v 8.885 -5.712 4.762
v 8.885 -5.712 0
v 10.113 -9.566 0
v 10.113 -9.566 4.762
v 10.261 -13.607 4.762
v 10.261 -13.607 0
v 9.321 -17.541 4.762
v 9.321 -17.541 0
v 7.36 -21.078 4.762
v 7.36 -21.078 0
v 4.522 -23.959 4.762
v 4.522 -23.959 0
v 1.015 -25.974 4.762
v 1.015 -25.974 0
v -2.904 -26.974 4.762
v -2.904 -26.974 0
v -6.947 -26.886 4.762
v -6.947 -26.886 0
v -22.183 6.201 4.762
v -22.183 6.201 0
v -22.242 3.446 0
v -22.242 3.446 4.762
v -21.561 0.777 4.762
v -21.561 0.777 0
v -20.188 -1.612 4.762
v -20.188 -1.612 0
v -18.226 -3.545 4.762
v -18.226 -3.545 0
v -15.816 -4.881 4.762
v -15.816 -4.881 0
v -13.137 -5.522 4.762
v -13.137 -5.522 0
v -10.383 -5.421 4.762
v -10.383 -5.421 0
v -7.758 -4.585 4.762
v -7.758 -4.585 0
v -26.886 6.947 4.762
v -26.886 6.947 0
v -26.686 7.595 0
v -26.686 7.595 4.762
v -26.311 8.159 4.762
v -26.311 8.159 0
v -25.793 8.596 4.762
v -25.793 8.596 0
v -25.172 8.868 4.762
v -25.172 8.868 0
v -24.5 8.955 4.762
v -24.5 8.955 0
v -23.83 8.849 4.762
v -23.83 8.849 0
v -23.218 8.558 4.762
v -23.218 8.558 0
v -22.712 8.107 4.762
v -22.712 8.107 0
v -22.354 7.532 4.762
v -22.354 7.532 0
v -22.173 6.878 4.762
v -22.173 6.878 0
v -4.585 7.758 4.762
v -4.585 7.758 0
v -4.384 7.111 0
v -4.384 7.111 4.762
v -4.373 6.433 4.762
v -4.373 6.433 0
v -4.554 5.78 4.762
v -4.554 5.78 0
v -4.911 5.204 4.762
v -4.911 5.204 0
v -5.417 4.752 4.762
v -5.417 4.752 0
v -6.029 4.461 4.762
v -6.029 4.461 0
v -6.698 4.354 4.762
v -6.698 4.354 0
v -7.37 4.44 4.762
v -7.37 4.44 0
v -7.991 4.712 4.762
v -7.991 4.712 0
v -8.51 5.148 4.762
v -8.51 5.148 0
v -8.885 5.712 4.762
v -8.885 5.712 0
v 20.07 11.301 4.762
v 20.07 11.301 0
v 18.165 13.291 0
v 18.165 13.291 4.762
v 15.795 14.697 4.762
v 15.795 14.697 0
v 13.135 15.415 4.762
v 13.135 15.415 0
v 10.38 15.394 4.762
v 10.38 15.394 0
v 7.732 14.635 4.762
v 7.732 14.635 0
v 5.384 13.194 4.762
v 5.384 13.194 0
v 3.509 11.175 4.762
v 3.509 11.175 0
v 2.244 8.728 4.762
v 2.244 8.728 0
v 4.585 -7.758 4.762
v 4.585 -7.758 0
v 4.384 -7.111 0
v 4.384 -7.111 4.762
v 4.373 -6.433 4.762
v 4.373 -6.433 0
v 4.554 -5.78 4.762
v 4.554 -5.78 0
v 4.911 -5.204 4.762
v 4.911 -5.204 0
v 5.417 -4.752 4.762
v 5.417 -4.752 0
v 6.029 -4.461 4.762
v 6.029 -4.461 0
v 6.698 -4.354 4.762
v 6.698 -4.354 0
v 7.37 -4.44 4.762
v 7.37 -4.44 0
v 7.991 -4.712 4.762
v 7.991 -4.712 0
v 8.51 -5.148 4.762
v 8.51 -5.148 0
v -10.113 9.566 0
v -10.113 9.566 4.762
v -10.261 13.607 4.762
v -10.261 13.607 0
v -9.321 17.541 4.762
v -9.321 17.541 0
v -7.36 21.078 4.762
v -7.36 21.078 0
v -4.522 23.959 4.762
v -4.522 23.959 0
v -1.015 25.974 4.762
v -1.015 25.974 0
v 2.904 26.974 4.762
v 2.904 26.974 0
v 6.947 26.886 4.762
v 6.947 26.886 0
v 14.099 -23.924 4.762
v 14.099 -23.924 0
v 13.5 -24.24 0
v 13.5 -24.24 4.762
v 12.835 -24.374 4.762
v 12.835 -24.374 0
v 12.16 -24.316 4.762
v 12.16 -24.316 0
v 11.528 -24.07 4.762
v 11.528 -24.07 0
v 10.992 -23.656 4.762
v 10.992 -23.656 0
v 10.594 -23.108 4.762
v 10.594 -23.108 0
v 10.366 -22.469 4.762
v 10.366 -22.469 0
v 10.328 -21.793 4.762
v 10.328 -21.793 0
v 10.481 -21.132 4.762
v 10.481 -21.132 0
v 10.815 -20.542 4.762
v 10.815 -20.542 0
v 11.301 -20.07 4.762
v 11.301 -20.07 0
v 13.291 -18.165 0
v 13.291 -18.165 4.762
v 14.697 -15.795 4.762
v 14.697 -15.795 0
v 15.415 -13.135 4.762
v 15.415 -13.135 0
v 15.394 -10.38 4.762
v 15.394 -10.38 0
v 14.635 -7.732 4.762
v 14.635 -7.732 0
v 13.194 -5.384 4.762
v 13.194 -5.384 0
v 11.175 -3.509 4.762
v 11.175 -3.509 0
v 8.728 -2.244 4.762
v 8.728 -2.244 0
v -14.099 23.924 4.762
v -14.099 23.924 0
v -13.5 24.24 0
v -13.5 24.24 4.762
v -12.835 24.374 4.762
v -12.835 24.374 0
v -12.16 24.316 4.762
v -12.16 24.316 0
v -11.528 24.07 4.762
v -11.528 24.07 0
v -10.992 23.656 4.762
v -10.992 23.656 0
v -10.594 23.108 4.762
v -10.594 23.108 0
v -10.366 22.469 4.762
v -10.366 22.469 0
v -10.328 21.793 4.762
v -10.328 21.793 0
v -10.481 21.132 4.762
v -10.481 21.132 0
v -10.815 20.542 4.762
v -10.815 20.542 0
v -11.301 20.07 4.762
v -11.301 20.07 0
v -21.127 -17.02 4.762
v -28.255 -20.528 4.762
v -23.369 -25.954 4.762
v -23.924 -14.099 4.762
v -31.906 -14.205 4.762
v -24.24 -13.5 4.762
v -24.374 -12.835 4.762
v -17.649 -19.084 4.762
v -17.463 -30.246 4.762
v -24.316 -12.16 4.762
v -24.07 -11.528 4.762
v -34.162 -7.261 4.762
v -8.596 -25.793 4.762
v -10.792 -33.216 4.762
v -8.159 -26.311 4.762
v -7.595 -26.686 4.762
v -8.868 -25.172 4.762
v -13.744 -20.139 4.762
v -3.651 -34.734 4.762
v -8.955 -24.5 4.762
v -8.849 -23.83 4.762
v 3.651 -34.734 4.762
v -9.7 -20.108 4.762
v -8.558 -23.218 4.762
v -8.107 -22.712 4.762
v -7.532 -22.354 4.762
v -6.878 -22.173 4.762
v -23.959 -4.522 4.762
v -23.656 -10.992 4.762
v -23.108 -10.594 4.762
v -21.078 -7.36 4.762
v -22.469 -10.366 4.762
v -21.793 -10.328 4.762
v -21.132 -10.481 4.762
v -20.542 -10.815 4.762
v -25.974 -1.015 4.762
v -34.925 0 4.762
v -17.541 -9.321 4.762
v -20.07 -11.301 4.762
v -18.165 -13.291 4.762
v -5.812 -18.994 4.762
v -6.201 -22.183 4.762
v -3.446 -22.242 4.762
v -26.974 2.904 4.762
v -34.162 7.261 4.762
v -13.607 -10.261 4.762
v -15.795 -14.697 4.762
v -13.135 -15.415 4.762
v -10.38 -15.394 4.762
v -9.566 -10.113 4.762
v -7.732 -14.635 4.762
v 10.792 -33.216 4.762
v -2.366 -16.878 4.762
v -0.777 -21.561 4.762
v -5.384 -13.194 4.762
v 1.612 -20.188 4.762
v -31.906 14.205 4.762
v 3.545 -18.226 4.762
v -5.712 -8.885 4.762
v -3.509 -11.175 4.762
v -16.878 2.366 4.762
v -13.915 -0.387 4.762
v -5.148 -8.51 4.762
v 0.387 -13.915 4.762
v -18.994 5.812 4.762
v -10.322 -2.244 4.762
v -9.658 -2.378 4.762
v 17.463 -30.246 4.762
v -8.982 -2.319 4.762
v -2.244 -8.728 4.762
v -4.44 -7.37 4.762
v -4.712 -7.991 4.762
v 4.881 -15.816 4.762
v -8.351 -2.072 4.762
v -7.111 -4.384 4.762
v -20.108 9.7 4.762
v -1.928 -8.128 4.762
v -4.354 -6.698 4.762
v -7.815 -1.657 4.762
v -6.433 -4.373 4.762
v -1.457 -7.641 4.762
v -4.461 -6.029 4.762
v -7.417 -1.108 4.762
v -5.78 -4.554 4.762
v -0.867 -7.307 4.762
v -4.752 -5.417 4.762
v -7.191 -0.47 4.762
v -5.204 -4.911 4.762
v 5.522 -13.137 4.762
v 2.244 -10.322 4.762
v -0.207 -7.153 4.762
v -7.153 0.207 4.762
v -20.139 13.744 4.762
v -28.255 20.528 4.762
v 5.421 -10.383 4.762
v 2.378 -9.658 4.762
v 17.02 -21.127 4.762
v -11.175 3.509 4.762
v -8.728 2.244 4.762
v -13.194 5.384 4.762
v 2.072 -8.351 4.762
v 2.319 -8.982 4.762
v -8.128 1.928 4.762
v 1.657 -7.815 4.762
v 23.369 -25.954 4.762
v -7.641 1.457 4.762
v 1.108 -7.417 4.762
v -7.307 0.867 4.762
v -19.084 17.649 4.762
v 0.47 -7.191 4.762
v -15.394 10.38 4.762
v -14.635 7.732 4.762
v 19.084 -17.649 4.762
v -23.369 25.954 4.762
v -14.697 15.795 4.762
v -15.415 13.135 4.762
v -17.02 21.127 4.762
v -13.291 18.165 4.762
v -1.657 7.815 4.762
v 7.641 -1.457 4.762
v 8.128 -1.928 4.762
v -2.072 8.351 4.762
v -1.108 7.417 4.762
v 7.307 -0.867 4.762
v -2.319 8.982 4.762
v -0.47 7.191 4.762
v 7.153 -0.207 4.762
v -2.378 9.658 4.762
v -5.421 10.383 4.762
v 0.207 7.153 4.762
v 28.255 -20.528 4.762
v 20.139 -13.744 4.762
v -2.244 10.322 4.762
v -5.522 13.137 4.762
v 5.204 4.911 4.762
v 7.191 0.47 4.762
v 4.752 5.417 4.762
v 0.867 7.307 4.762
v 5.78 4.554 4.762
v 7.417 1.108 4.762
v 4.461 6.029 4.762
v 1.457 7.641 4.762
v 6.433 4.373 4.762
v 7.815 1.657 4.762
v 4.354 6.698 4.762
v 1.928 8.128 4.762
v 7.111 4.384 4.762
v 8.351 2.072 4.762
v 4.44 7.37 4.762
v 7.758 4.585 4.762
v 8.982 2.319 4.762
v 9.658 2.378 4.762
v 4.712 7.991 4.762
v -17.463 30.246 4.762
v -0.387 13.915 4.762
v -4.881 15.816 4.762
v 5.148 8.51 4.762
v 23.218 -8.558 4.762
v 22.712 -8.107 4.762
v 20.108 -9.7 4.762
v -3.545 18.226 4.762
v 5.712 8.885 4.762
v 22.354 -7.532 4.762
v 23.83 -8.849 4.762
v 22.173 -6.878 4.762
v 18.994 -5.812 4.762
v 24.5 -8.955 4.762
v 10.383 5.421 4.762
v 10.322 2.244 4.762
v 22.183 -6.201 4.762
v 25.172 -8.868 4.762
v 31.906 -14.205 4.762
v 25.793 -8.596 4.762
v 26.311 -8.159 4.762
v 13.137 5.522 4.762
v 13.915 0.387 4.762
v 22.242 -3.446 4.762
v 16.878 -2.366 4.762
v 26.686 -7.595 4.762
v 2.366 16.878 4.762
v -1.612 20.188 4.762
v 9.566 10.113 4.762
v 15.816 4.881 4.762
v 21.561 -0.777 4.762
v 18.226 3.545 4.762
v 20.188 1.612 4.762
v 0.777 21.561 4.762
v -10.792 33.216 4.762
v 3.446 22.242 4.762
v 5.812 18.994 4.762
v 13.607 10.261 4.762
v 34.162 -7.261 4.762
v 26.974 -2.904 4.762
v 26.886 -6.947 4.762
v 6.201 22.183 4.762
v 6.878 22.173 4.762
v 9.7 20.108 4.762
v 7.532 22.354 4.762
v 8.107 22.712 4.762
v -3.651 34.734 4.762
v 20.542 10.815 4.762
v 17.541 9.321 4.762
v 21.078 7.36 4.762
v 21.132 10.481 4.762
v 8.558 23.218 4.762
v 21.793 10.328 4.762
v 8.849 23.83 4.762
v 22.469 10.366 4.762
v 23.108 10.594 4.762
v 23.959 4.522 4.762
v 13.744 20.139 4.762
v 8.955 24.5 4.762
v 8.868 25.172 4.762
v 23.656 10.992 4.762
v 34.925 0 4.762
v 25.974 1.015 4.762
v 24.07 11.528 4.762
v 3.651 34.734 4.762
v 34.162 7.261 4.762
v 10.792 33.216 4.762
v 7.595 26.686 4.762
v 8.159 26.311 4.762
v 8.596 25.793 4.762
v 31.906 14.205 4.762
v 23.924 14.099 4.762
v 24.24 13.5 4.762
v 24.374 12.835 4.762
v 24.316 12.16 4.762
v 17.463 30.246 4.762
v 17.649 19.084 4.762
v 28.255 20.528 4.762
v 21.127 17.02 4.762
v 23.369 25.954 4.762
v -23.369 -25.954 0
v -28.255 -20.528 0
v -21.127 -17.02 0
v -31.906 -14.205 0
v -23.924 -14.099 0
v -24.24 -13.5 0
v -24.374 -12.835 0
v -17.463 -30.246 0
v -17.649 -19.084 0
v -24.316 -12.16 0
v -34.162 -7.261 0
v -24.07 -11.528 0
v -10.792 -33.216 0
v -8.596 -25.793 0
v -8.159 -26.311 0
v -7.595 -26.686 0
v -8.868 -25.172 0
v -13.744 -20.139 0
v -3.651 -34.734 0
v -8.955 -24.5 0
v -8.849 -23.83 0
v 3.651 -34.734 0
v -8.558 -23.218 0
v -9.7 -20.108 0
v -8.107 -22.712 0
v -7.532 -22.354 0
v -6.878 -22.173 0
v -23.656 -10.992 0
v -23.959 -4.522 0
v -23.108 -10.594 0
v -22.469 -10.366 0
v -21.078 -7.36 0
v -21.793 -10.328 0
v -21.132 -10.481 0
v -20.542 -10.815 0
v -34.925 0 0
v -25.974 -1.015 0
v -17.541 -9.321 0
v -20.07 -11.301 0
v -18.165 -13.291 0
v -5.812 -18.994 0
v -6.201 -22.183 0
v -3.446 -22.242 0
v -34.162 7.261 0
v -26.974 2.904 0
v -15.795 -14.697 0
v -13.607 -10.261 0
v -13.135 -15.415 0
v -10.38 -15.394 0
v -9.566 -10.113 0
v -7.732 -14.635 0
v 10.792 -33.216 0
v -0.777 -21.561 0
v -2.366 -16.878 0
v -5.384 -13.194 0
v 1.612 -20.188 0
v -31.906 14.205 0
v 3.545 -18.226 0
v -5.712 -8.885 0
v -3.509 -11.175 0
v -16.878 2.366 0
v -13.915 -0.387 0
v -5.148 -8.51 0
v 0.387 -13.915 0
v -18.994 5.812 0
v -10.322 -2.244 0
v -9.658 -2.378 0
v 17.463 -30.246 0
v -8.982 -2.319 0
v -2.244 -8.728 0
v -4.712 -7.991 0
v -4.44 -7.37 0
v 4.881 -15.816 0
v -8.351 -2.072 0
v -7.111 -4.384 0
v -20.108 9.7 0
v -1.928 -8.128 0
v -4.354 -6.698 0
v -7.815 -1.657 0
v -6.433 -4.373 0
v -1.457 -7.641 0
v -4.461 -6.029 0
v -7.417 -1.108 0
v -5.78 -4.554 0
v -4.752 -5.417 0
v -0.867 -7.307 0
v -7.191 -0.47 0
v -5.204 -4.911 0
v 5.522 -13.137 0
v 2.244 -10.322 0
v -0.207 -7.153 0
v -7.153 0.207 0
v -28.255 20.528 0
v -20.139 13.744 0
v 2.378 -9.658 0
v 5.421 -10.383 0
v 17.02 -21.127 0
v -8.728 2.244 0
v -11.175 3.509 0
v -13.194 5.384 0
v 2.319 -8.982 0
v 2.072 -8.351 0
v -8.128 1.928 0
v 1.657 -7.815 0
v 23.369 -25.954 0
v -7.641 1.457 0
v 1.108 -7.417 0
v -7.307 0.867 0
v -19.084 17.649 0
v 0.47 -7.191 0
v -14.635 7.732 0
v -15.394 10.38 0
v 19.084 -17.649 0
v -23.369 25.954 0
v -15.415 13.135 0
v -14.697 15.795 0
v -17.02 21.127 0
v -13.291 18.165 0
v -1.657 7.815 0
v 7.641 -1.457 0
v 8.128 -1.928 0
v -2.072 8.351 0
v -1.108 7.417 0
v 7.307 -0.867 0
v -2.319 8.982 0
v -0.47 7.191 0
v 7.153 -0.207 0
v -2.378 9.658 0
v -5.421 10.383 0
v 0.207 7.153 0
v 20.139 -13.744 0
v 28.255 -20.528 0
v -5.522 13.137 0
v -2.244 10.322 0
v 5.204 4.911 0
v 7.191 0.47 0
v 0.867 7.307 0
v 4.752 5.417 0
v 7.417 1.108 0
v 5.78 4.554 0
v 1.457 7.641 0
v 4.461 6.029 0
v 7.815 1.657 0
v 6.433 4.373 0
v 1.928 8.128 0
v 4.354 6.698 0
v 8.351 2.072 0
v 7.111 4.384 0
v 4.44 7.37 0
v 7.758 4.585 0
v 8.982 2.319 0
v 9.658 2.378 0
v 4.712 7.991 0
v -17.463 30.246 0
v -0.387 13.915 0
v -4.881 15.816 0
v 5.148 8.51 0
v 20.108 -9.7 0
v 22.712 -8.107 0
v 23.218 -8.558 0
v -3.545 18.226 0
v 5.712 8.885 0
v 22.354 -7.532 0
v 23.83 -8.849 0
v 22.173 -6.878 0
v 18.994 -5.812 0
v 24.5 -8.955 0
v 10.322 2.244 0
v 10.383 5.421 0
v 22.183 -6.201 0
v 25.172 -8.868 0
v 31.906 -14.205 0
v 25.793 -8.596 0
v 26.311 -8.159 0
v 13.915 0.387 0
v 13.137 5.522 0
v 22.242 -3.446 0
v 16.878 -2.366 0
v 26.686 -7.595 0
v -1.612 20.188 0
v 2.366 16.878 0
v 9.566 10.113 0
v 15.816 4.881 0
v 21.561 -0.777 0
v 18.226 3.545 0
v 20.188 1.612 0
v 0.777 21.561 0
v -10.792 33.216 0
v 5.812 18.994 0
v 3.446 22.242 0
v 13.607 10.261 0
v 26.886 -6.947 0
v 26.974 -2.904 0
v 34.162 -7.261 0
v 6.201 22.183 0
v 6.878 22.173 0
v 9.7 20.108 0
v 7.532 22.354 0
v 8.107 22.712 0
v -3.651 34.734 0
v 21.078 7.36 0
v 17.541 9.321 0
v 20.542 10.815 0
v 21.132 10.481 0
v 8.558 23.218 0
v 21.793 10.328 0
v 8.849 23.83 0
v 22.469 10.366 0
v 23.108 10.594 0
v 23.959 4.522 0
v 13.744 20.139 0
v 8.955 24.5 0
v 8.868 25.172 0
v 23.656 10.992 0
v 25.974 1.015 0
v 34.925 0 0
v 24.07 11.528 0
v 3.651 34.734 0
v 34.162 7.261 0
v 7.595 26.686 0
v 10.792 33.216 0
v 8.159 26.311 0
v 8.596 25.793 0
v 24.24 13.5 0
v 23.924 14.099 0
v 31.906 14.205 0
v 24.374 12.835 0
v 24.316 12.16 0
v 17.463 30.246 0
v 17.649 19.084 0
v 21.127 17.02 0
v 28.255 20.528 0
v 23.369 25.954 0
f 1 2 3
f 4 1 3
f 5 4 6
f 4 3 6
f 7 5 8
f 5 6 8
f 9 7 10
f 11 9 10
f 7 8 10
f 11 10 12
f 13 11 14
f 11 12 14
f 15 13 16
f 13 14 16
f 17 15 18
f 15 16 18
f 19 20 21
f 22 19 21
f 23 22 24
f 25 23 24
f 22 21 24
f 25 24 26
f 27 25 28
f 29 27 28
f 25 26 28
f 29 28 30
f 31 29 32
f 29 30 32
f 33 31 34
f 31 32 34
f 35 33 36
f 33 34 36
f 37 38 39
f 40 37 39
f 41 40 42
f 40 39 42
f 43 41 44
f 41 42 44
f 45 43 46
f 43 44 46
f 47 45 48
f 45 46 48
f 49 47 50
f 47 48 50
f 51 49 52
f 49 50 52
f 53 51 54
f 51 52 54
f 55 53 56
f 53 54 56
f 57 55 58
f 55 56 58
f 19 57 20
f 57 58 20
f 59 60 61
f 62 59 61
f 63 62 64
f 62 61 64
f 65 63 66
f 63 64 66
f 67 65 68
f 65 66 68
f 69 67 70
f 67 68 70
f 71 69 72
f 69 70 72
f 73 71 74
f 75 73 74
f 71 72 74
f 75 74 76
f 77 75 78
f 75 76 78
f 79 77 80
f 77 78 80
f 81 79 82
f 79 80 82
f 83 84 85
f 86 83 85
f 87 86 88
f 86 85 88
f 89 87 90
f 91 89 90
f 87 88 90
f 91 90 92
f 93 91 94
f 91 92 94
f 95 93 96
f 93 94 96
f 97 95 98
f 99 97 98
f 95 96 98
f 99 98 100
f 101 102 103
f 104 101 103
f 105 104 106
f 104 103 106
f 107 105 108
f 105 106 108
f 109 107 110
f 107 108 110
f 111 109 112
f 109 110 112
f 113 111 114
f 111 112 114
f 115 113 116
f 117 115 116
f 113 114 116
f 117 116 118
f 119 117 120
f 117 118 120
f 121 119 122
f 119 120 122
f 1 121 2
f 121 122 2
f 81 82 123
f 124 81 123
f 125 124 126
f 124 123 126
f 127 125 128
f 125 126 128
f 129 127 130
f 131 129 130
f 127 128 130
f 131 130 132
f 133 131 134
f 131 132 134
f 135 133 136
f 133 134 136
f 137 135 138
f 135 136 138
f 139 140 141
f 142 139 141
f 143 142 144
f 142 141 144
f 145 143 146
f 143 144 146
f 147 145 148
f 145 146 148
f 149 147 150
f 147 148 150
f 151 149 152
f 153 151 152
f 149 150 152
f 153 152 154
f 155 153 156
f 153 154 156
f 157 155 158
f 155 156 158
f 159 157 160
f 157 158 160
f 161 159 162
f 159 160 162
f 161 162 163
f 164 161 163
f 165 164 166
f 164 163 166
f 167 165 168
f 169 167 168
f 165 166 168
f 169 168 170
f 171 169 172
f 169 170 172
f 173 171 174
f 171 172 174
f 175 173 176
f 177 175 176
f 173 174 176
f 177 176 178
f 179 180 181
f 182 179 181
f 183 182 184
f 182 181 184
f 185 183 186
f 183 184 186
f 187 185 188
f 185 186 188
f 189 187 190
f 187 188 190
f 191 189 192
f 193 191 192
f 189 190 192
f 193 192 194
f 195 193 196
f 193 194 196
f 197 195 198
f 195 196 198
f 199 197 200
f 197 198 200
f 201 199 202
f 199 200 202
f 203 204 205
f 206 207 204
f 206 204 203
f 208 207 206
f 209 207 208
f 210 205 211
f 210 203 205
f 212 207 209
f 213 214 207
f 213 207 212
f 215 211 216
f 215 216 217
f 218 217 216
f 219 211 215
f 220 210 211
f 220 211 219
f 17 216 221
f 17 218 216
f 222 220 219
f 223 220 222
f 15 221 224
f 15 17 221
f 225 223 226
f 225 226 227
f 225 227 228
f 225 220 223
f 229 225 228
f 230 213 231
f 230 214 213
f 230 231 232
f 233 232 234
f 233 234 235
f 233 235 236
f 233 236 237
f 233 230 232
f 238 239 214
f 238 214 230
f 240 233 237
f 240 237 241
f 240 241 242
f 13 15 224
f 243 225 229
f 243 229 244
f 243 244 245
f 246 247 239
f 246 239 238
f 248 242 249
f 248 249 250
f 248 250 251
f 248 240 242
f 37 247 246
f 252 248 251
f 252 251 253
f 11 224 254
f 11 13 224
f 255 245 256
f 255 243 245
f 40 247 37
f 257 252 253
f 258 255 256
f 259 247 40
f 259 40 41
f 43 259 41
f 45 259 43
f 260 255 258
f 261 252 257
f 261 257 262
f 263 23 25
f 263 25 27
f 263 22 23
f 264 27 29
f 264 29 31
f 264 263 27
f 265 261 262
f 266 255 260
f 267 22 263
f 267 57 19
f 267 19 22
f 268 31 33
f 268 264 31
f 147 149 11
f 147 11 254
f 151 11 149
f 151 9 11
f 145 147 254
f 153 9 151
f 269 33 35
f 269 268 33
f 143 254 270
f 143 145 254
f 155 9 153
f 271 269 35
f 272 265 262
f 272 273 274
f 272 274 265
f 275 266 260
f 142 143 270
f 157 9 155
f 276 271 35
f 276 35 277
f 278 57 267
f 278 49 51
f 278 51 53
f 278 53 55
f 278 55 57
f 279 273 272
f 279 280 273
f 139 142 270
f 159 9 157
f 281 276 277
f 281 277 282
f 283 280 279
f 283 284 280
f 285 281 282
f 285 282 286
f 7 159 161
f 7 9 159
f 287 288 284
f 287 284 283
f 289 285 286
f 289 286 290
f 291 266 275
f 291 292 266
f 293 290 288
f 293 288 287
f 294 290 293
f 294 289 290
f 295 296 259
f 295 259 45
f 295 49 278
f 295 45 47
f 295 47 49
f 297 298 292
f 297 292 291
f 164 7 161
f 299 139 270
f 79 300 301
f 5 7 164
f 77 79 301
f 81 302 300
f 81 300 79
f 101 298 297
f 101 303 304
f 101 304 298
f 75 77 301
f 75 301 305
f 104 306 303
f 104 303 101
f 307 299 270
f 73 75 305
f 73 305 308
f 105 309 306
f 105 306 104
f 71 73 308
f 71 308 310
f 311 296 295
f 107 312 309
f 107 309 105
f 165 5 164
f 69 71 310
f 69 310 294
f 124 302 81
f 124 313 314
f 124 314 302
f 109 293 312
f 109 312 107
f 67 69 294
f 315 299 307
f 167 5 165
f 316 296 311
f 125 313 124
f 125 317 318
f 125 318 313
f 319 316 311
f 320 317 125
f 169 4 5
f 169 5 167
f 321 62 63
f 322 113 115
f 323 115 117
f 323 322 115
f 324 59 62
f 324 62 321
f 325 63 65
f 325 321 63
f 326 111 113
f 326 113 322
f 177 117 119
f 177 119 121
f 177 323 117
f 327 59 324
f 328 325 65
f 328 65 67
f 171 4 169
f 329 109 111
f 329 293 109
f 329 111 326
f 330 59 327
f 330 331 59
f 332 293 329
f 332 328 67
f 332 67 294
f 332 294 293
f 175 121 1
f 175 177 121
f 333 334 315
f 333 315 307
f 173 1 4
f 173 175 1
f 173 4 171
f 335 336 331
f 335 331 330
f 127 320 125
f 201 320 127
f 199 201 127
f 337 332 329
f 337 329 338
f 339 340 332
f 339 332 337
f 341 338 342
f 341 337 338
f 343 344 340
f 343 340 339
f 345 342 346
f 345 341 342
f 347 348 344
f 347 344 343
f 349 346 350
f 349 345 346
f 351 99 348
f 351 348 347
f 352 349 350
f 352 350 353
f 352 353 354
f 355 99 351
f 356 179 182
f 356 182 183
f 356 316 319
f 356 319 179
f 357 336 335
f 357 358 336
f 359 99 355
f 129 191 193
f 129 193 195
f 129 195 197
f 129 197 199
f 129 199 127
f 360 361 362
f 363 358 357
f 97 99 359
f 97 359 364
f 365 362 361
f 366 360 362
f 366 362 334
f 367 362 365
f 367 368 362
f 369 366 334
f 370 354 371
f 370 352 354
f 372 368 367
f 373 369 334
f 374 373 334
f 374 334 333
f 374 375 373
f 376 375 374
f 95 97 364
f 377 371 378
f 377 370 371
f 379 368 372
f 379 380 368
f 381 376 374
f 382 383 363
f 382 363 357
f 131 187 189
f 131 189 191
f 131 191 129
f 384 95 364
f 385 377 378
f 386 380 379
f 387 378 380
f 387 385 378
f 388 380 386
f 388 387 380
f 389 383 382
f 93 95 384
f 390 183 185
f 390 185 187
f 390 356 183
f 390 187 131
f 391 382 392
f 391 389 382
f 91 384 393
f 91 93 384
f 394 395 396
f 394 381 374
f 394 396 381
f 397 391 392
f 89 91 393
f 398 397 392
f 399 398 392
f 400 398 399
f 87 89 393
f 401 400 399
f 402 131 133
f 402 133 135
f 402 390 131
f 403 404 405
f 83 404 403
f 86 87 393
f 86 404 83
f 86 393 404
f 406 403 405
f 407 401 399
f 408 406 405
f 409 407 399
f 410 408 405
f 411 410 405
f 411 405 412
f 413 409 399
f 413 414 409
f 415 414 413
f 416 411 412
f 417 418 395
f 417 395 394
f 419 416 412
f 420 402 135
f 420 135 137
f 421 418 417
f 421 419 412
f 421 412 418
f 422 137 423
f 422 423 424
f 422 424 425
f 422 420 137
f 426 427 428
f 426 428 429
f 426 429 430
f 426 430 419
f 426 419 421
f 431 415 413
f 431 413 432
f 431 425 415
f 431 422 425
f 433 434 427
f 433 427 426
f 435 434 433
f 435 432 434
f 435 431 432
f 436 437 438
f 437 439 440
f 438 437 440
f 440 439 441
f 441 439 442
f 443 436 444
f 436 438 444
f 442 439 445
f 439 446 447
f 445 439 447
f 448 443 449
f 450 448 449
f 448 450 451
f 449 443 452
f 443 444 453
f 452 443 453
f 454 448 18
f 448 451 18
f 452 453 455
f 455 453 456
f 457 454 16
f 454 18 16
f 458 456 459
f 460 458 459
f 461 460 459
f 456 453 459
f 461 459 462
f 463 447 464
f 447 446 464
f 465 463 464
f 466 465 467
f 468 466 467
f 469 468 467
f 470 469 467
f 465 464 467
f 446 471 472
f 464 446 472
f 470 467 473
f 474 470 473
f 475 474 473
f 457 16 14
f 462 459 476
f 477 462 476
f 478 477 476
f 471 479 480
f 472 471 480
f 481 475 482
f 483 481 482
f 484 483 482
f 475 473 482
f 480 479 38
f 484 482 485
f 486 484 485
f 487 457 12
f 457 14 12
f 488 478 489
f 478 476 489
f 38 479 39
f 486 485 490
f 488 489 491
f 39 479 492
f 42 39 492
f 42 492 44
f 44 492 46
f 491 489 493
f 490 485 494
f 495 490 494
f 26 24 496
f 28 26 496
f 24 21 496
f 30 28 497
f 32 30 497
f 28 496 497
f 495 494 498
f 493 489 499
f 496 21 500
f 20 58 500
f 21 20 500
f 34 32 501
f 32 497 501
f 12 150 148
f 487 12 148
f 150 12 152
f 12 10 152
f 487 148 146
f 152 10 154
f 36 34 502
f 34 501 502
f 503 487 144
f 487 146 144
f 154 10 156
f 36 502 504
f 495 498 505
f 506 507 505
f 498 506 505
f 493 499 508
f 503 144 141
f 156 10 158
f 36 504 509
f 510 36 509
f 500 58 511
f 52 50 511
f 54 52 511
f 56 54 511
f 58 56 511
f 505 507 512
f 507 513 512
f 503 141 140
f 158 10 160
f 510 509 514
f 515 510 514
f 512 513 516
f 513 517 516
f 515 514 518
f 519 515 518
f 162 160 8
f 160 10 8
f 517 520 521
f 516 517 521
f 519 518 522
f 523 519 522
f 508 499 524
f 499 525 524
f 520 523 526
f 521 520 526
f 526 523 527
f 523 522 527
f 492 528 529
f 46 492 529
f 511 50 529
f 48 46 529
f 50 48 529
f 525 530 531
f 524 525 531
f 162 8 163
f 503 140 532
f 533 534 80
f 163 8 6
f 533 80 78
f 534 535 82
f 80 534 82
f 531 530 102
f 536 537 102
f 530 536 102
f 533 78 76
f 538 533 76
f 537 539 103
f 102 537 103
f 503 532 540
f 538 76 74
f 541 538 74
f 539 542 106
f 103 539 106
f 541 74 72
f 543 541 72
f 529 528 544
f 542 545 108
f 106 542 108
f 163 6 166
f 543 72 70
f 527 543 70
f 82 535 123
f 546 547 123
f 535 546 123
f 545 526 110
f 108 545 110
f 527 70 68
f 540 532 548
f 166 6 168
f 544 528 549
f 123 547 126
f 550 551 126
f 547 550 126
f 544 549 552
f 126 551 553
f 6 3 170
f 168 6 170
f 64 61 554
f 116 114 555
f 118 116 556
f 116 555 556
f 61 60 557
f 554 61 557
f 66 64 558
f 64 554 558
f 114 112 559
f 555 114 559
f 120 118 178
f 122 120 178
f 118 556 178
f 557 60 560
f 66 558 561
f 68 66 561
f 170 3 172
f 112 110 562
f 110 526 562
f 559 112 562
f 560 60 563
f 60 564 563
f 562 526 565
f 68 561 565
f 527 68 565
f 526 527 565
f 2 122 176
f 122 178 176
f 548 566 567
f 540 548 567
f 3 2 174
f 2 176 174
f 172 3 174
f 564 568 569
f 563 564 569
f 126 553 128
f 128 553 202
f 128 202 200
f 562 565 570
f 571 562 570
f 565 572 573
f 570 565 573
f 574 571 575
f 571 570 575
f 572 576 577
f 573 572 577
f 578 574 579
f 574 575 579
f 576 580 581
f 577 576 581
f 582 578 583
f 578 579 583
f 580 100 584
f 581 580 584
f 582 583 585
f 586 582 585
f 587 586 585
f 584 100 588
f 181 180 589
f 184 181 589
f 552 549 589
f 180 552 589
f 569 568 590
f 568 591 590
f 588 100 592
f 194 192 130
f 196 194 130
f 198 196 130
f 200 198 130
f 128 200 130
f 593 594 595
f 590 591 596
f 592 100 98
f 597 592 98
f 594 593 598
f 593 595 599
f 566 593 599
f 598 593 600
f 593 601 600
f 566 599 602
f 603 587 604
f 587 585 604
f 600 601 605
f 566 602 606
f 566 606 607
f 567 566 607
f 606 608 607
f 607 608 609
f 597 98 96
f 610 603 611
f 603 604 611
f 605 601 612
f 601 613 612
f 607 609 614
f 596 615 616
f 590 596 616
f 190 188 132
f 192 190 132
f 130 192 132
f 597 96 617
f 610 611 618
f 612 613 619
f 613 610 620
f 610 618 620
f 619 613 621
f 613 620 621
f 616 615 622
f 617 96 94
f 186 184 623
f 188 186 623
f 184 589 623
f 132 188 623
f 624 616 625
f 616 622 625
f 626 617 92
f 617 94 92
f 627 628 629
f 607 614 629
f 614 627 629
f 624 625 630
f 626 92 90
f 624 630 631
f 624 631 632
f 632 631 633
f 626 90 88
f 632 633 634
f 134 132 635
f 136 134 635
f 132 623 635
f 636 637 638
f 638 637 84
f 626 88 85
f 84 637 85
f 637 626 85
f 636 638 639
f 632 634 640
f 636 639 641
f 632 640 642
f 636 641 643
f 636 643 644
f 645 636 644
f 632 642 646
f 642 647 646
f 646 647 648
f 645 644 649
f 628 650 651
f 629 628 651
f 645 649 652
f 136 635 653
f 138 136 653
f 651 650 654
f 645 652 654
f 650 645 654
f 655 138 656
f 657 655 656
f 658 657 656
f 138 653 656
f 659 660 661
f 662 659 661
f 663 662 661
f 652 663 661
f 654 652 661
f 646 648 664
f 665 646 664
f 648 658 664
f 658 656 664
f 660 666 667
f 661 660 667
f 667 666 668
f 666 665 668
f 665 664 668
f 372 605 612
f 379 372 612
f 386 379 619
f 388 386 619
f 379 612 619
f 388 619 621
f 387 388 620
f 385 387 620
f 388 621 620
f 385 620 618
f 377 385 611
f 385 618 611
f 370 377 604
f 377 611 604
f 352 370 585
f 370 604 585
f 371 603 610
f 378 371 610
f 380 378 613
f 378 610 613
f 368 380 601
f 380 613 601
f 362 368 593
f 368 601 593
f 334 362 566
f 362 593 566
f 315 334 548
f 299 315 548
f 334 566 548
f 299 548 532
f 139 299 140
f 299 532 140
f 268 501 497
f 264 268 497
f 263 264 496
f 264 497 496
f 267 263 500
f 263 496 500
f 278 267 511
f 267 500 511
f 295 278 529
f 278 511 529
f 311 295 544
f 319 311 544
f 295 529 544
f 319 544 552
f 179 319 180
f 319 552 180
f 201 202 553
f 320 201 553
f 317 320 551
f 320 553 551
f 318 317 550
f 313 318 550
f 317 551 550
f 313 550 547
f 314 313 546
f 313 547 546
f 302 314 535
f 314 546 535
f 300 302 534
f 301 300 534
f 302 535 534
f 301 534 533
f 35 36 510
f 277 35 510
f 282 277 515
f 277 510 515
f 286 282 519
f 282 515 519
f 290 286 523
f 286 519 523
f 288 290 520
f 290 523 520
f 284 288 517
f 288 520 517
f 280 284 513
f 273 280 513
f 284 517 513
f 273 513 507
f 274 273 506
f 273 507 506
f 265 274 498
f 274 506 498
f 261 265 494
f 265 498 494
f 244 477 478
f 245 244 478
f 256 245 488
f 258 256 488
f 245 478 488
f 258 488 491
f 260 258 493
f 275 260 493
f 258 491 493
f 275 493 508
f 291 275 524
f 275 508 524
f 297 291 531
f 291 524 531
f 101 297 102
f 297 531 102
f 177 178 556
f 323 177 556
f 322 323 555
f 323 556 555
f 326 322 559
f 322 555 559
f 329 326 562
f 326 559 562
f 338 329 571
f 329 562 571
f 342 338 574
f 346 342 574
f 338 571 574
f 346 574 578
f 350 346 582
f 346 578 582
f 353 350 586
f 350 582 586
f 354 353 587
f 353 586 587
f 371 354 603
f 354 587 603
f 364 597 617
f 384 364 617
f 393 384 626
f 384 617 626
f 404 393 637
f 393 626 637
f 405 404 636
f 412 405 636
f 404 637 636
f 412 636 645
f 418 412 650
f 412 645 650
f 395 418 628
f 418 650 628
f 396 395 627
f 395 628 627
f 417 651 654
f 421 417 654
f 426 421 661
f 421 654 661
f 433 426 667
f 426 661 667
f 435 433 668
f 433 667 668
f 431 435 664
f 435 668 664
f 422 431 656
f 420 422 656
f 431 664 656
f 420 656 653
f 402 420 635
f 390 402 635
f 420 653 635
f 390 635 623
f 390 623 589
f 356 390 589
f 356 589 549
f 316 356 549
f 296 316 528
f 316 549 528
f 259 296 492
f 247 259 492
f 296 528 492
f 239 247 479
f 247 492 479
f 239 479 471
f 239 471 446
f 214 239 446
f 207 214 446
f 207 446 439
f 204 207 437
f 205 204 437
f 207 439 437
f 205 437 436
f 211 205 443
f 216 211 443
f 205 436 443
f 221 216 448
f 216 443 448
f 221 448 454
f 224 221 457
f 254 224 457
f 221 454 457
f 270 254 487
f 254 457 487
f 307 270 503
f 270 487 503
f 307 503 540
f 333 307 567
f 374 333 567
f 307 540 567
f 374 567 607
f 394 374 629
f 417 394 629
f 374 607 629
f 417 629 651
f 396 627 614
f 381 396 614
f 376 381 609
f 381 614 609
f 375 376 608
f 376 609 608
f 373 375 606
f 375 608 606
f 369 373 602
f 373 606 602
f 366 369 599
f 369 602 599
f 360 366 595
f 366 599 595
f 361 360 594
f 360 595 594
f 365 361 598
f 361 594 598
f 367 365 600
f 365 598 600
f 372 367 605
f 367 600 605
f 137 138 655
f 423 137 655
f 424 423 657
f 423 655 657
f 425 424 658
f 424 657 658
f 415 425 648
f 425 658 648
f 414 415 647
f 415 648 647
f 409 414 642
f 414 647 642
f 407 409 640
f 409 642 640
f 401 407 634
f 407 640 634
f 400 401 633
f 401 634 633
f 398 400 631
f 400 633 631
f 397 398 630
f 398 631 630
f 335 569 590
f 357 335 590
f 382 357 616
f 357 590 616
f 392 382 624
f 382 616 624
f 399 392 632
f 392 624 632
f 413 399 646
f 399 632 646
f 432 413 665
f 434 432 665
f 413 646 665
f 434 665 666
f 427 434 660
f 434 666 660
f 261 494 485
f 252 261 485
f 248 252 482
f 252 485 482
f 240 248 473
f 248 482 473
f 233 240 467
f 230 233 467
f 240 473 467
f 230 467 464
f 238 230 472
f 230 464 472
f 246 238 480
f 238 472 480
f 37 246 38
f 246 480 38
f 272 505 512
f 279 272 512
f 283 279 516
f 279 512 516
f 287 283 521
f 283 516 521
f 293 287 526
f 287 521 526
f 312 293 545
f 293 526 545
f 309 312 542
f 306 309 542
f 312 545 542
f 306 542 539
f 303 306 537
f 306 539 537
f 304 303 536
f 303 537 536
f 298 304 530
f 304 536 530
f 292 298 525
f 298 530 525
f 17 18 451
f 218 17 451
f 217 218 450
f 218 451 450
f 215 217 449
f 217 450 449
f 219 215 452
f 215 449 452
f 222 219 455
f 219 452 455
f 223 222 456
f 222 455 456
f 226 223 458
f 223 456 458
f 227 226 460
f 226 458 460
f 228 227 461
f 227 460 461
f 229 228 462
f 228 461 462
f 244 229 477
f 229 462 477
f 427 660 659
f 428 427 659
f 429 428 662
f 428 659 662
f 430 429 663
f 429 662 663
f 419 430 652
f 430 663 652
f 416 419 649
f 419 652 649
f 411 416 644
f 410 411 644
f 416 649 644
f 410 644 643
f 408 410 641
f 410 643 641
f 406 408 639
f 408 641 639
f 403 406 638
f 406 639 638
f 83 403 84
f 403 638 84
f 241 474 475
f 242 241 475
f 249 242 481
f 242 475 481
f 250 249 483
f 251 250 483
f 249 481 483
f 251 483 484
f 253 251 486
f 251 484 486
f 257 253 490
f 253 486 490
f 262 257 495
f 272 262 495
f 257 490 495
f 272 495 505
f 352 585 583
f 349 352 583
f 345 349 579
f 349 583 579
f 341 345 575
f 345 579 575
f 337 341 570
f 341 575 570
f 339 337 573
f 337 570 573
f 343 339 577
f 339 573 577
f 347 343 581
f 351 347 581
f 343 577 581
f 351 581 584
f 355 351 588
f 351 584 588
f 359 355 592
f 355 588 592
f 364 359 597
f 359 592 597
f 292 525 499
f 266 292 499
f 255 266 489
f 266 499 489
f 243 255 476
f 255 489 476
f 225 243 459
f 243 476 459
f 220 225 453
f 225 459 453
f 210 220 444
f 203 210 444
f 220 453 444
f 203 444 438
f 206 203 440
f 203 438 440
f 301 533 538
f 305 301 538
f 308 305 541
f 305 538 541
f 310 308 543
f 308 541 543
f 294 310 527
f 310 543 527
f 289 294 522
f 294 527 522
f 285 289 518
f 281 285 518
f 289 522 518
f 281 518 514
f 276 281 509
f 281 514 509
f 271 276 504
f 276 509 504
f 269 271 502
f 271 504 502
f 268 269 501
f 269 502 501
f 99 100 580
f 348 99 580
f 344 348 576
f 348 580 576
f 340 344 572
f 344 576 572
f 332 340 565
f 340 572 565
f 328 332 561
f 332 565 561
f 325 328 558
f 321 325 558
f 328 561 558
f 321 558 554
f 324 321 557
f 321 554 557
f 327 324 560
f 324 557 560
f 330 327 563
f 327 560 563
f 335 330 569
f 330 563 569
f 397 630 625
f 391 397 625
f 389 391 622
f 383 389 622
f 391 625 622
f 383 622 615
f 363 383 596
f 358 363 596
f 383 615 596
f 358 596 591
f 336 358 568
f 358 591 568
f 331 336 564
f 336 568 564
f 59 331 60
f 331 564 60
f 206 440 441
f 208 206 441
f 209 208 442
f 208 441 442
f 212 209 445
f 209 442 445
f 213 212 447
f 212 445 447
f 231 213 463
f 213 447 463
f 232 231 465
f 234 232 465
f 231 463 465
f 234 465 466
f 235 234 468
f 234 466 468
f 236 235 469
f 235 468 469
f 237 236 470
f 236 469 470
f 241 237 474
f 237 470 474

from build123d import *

# Parameters (mm, degrees)
SKETCH1_R           = 34.925
BOSS_EXTRUDE1_DEPTH = 4.7625


with BuildPart() as part:
    # Sketch1 → Boss-Extrude1 (new body)
    with BuildSketch(Plane.XY):
        Circle(SKETCH1_R)
        with BuildLine():
            ThreePointArc((2.243888697, 8.727933453), (-0.797066547, 7.281111303), (-2.243888697, 10.322066547))
            ThreePointArc((-2.243888697, 10.322066547), (9.70011878, 20.108105734), (23.923949148, 14.099068603))
            ThreePointArc((23.923949148, 14.099068603), (23.396113859, 10.773096108), (20.070141364, 11.300931397))
            ThreePointArc((20.070141364, 11.300931397), (10.380475923, 15.394453179), (2.243888697, 8.727933453))
        make_face(mode=Mode.SUBTRACT)
        with BuildLine():
            ThreePointArc((5.712134337, 8.885472165), (21.077597689, 7.359558154), (26.886333692, -6.947239658))
            ThreePointArc((26.886333692, -6.947239658), (24.161280075, -8.92582145), (22.182698283, -6.200767833))
            ThreePointArc((22.182698283, -6.200767833), (18.225627153, 3.545417318), (7.758249844, 4.584912017))
            ThreePointArc((7.758249844, 4.584912017), (4.584912017, 5.712134337), (5.712134337, 8.885472165))
        make_face(mode=Mode.SUBTRACT)
        with BuildLine():
            ThreePointArc((10.322066547, 2.243888697), (20.108105734, -9.70011878), (14.099068603, -23.923949148))
            ThreePointArc((14.099068603, -23.923949148), (10.773096108, -23.396113859), (11.300931397, -20.070141364))
            ThreePointArc((11.300931397, -20.070141364), (15.394453179, -10.380475923), (8.727933453, -2.243888697))
            ThreePointArc((8.727933453, -2.243888697), (7.281111303, 0.797066547), (10.322066547, 2.243888697))
        make_face(mode=Mode.SUBTRACT)
        with BuildLine():
            ThreePointArc((8.885472165, -5.712134337), (7.359558154, -21.077597689), (-6.947239658, -26.886333692))
            ThreePointArc((-6.947239658, -26.886333692), (-8.92582145, -24.161280075), (-6.200767833, -22.182698283))
            ThreePointArc((-6.200767833, -22.182698283), (3.545417318, -18.225627153), (4.584912017, -7.758249844))
            ThreePointArc((4.584912017, -7.758249844), (5.712134337, -4.584912017), (8.885472165, -5.712134337))
        make_face(mode=Mode.SUBTRACT)
        with BuildLine():
            ThreePointArc((2.243888697, -10.322066547), (-9.70011878, -20.108105734), (-23.923949148, -14.099068603))
            ThreePointArc((-23.923949148, -14.099068603), (-23.396113859, -10.773096108), (-20.070141364, -11.300931397))
            ThreePointArc((-20.070141364, -11.300931397), (-10.380475923, -15.394453179), (-2.243888697, -8.727933453))
            ThreePointArc((-2.243888697, -8.727933453), (0.797066547, -7.281111303), (2.243888697, -10.322066547))
        make_face(mode=Mode.SUBTRACT)
        with BuildLine():
            ThreePointArc((-5.712134337, -8.885472165), (-21.077597689, -7.359558154), (-26.886333692, 6.947239658))
            ThreePointArc((-26.886333692, 6.947239658), (-24.161280075, 8.92582145), (-22.182698283, 6.200767833))
            ThreePointArc((-22.182698283, 6.200767833), (-18.225627153, -3.545417318), (-7.758249844, -4.584912017))
            ThreePointArc((-7.758249844, -4.584912017), (-4.584912017, -5.712134337), (-5.712134337, -8.885472165))
        make_face(mode=Mode.SUBTRACT)
        with BuildLine():
            ThreePointArc((-10.322066547, -2.243888697), (-20.108105734, 9.70011878), (-14.099068603, 23.923949148))
            ThreePointArc((-14.099068603, 23.923949148), (-10.773096108, 23.396113859), (-11.300931397, 20.070141364))
            ThreePointArc((-11.300931397, 20.070141364), (-15.394453179, 10.380475923), (-8.727933453, 2.243888697))
            ThreePointArc((-8.727933453, 2.243888697), (-7.281111303, -0.797066547), (-10.322066547, -2.243888697))
        make_face(mode=Mode.SUBTRACT)
        with BuildLine():
            ThreePointArc((-8.885472165, 5.712134337), (-7.359558154, 21.077597689), (6.947239658, 26.886333692))
            ThreePointArc((6.947239658, 26.886333692), (8.92582145, 24.161280075), (6.200767833, 22.182698283))
            ThreePointArc((6.200767833, 22.182698283), (-3.545417318, 18.225627153), (-4.584912017, 7.758249844))
            ThreePointArc((-4.584912017, 7.758249844), (-5.712134337, 4.584912017), (-8.885472165, 5.712134337))
        make_face(mode=Mode.SUBTRACT)
    extrude(amount=BOSS_EXTRUDE1_DEPTH)


solid = part.part
